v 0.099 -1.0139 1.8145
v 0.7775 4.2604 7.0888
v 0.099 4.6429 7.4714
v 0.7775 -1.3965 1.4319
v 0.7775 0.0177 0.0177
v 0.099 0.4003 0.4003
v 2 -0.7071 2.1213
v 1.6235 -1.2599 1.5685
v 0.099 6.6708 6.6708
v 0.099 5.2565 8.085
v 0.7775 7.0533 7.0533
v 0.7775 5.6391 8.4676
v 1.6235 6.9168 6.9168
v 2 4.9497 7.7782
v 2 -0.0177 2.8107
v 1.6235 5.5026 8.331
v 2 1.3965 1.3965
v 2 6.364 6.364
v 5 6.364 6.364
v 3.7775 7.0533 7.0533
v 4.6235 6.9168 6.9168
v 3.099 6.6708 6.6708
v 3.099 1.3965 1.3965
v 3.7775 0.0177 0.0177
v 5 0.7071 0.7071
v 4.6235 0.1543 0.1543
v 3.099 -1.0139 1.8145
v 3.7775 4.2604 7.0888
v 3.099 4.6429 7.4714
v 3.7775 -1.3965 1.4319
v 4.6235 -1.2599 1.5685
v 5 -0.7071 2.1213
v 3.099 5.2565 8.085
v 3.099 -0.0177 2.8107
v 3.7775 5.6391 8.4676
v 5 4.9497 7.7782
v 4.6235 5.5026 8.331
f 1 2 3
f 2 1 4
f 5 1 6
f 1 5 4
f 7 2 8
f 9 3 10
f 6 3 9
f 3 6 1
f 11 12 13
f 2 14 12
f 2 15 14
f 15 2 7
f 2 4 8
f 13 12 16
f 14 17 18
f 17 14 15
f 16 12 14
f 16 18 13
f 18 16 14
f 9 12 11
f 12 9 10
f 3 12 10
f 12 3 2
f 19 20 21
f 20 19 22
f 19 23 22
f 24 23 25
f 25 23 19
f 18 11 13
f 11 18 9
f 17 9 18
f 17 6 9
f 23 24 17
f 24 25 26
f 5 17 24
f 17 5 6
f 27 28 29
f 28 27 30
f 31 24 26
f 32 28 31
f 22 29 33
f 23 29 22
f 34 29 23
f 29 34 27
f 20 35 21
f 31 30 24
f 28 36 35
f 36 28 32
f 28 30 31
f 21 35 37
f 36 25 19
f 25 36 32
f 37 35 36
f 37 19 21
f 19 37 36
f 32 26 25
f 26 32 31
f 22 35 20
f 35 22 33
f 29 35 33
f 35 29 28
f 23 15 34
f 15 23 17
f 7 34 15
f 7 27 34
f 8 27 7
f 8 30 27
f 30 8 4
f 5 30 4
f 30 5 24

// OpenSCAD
$fn=7;
union()
{
	hull()
	{
		translate([1,0.70710677,0.70710677])
		{
			rotate(44.999996,[1,0,0])
			{
				cylinder(h=2,d=2);
			}
		}
		translate([1,6.3639607,6.3639607])
		{
			rotate(44.999996,[1,0,0])
			{
				cylinder(h=2,d=2);
			}
		}
	}
	hull()
	{
		translate([4,0.70710677,0.70710677])
		{
			rotate(44.999996,[1,0,0])
			{
				cylinder(h=2,d=2);
			}
		}
		translate([4,6.3639607,6.3639607])
		{
			rotate(44.999996,[1,0,0])
			{
				cylinder(h=2,d=2);
			}
		}
	}
	hull()
	{
		translate([4,0.70710677,0.70710677])
		{
			rotate(44.999996,[1,0,0])
			{
				cylinder(h=2,d=2);
			}
		}
		translate([1,0.70710677,0.70710677])
		{
			rotate(44.999996,[1,0,0])
			{
				cylinder(h=2,d=2);
			}
		}
	}
}
